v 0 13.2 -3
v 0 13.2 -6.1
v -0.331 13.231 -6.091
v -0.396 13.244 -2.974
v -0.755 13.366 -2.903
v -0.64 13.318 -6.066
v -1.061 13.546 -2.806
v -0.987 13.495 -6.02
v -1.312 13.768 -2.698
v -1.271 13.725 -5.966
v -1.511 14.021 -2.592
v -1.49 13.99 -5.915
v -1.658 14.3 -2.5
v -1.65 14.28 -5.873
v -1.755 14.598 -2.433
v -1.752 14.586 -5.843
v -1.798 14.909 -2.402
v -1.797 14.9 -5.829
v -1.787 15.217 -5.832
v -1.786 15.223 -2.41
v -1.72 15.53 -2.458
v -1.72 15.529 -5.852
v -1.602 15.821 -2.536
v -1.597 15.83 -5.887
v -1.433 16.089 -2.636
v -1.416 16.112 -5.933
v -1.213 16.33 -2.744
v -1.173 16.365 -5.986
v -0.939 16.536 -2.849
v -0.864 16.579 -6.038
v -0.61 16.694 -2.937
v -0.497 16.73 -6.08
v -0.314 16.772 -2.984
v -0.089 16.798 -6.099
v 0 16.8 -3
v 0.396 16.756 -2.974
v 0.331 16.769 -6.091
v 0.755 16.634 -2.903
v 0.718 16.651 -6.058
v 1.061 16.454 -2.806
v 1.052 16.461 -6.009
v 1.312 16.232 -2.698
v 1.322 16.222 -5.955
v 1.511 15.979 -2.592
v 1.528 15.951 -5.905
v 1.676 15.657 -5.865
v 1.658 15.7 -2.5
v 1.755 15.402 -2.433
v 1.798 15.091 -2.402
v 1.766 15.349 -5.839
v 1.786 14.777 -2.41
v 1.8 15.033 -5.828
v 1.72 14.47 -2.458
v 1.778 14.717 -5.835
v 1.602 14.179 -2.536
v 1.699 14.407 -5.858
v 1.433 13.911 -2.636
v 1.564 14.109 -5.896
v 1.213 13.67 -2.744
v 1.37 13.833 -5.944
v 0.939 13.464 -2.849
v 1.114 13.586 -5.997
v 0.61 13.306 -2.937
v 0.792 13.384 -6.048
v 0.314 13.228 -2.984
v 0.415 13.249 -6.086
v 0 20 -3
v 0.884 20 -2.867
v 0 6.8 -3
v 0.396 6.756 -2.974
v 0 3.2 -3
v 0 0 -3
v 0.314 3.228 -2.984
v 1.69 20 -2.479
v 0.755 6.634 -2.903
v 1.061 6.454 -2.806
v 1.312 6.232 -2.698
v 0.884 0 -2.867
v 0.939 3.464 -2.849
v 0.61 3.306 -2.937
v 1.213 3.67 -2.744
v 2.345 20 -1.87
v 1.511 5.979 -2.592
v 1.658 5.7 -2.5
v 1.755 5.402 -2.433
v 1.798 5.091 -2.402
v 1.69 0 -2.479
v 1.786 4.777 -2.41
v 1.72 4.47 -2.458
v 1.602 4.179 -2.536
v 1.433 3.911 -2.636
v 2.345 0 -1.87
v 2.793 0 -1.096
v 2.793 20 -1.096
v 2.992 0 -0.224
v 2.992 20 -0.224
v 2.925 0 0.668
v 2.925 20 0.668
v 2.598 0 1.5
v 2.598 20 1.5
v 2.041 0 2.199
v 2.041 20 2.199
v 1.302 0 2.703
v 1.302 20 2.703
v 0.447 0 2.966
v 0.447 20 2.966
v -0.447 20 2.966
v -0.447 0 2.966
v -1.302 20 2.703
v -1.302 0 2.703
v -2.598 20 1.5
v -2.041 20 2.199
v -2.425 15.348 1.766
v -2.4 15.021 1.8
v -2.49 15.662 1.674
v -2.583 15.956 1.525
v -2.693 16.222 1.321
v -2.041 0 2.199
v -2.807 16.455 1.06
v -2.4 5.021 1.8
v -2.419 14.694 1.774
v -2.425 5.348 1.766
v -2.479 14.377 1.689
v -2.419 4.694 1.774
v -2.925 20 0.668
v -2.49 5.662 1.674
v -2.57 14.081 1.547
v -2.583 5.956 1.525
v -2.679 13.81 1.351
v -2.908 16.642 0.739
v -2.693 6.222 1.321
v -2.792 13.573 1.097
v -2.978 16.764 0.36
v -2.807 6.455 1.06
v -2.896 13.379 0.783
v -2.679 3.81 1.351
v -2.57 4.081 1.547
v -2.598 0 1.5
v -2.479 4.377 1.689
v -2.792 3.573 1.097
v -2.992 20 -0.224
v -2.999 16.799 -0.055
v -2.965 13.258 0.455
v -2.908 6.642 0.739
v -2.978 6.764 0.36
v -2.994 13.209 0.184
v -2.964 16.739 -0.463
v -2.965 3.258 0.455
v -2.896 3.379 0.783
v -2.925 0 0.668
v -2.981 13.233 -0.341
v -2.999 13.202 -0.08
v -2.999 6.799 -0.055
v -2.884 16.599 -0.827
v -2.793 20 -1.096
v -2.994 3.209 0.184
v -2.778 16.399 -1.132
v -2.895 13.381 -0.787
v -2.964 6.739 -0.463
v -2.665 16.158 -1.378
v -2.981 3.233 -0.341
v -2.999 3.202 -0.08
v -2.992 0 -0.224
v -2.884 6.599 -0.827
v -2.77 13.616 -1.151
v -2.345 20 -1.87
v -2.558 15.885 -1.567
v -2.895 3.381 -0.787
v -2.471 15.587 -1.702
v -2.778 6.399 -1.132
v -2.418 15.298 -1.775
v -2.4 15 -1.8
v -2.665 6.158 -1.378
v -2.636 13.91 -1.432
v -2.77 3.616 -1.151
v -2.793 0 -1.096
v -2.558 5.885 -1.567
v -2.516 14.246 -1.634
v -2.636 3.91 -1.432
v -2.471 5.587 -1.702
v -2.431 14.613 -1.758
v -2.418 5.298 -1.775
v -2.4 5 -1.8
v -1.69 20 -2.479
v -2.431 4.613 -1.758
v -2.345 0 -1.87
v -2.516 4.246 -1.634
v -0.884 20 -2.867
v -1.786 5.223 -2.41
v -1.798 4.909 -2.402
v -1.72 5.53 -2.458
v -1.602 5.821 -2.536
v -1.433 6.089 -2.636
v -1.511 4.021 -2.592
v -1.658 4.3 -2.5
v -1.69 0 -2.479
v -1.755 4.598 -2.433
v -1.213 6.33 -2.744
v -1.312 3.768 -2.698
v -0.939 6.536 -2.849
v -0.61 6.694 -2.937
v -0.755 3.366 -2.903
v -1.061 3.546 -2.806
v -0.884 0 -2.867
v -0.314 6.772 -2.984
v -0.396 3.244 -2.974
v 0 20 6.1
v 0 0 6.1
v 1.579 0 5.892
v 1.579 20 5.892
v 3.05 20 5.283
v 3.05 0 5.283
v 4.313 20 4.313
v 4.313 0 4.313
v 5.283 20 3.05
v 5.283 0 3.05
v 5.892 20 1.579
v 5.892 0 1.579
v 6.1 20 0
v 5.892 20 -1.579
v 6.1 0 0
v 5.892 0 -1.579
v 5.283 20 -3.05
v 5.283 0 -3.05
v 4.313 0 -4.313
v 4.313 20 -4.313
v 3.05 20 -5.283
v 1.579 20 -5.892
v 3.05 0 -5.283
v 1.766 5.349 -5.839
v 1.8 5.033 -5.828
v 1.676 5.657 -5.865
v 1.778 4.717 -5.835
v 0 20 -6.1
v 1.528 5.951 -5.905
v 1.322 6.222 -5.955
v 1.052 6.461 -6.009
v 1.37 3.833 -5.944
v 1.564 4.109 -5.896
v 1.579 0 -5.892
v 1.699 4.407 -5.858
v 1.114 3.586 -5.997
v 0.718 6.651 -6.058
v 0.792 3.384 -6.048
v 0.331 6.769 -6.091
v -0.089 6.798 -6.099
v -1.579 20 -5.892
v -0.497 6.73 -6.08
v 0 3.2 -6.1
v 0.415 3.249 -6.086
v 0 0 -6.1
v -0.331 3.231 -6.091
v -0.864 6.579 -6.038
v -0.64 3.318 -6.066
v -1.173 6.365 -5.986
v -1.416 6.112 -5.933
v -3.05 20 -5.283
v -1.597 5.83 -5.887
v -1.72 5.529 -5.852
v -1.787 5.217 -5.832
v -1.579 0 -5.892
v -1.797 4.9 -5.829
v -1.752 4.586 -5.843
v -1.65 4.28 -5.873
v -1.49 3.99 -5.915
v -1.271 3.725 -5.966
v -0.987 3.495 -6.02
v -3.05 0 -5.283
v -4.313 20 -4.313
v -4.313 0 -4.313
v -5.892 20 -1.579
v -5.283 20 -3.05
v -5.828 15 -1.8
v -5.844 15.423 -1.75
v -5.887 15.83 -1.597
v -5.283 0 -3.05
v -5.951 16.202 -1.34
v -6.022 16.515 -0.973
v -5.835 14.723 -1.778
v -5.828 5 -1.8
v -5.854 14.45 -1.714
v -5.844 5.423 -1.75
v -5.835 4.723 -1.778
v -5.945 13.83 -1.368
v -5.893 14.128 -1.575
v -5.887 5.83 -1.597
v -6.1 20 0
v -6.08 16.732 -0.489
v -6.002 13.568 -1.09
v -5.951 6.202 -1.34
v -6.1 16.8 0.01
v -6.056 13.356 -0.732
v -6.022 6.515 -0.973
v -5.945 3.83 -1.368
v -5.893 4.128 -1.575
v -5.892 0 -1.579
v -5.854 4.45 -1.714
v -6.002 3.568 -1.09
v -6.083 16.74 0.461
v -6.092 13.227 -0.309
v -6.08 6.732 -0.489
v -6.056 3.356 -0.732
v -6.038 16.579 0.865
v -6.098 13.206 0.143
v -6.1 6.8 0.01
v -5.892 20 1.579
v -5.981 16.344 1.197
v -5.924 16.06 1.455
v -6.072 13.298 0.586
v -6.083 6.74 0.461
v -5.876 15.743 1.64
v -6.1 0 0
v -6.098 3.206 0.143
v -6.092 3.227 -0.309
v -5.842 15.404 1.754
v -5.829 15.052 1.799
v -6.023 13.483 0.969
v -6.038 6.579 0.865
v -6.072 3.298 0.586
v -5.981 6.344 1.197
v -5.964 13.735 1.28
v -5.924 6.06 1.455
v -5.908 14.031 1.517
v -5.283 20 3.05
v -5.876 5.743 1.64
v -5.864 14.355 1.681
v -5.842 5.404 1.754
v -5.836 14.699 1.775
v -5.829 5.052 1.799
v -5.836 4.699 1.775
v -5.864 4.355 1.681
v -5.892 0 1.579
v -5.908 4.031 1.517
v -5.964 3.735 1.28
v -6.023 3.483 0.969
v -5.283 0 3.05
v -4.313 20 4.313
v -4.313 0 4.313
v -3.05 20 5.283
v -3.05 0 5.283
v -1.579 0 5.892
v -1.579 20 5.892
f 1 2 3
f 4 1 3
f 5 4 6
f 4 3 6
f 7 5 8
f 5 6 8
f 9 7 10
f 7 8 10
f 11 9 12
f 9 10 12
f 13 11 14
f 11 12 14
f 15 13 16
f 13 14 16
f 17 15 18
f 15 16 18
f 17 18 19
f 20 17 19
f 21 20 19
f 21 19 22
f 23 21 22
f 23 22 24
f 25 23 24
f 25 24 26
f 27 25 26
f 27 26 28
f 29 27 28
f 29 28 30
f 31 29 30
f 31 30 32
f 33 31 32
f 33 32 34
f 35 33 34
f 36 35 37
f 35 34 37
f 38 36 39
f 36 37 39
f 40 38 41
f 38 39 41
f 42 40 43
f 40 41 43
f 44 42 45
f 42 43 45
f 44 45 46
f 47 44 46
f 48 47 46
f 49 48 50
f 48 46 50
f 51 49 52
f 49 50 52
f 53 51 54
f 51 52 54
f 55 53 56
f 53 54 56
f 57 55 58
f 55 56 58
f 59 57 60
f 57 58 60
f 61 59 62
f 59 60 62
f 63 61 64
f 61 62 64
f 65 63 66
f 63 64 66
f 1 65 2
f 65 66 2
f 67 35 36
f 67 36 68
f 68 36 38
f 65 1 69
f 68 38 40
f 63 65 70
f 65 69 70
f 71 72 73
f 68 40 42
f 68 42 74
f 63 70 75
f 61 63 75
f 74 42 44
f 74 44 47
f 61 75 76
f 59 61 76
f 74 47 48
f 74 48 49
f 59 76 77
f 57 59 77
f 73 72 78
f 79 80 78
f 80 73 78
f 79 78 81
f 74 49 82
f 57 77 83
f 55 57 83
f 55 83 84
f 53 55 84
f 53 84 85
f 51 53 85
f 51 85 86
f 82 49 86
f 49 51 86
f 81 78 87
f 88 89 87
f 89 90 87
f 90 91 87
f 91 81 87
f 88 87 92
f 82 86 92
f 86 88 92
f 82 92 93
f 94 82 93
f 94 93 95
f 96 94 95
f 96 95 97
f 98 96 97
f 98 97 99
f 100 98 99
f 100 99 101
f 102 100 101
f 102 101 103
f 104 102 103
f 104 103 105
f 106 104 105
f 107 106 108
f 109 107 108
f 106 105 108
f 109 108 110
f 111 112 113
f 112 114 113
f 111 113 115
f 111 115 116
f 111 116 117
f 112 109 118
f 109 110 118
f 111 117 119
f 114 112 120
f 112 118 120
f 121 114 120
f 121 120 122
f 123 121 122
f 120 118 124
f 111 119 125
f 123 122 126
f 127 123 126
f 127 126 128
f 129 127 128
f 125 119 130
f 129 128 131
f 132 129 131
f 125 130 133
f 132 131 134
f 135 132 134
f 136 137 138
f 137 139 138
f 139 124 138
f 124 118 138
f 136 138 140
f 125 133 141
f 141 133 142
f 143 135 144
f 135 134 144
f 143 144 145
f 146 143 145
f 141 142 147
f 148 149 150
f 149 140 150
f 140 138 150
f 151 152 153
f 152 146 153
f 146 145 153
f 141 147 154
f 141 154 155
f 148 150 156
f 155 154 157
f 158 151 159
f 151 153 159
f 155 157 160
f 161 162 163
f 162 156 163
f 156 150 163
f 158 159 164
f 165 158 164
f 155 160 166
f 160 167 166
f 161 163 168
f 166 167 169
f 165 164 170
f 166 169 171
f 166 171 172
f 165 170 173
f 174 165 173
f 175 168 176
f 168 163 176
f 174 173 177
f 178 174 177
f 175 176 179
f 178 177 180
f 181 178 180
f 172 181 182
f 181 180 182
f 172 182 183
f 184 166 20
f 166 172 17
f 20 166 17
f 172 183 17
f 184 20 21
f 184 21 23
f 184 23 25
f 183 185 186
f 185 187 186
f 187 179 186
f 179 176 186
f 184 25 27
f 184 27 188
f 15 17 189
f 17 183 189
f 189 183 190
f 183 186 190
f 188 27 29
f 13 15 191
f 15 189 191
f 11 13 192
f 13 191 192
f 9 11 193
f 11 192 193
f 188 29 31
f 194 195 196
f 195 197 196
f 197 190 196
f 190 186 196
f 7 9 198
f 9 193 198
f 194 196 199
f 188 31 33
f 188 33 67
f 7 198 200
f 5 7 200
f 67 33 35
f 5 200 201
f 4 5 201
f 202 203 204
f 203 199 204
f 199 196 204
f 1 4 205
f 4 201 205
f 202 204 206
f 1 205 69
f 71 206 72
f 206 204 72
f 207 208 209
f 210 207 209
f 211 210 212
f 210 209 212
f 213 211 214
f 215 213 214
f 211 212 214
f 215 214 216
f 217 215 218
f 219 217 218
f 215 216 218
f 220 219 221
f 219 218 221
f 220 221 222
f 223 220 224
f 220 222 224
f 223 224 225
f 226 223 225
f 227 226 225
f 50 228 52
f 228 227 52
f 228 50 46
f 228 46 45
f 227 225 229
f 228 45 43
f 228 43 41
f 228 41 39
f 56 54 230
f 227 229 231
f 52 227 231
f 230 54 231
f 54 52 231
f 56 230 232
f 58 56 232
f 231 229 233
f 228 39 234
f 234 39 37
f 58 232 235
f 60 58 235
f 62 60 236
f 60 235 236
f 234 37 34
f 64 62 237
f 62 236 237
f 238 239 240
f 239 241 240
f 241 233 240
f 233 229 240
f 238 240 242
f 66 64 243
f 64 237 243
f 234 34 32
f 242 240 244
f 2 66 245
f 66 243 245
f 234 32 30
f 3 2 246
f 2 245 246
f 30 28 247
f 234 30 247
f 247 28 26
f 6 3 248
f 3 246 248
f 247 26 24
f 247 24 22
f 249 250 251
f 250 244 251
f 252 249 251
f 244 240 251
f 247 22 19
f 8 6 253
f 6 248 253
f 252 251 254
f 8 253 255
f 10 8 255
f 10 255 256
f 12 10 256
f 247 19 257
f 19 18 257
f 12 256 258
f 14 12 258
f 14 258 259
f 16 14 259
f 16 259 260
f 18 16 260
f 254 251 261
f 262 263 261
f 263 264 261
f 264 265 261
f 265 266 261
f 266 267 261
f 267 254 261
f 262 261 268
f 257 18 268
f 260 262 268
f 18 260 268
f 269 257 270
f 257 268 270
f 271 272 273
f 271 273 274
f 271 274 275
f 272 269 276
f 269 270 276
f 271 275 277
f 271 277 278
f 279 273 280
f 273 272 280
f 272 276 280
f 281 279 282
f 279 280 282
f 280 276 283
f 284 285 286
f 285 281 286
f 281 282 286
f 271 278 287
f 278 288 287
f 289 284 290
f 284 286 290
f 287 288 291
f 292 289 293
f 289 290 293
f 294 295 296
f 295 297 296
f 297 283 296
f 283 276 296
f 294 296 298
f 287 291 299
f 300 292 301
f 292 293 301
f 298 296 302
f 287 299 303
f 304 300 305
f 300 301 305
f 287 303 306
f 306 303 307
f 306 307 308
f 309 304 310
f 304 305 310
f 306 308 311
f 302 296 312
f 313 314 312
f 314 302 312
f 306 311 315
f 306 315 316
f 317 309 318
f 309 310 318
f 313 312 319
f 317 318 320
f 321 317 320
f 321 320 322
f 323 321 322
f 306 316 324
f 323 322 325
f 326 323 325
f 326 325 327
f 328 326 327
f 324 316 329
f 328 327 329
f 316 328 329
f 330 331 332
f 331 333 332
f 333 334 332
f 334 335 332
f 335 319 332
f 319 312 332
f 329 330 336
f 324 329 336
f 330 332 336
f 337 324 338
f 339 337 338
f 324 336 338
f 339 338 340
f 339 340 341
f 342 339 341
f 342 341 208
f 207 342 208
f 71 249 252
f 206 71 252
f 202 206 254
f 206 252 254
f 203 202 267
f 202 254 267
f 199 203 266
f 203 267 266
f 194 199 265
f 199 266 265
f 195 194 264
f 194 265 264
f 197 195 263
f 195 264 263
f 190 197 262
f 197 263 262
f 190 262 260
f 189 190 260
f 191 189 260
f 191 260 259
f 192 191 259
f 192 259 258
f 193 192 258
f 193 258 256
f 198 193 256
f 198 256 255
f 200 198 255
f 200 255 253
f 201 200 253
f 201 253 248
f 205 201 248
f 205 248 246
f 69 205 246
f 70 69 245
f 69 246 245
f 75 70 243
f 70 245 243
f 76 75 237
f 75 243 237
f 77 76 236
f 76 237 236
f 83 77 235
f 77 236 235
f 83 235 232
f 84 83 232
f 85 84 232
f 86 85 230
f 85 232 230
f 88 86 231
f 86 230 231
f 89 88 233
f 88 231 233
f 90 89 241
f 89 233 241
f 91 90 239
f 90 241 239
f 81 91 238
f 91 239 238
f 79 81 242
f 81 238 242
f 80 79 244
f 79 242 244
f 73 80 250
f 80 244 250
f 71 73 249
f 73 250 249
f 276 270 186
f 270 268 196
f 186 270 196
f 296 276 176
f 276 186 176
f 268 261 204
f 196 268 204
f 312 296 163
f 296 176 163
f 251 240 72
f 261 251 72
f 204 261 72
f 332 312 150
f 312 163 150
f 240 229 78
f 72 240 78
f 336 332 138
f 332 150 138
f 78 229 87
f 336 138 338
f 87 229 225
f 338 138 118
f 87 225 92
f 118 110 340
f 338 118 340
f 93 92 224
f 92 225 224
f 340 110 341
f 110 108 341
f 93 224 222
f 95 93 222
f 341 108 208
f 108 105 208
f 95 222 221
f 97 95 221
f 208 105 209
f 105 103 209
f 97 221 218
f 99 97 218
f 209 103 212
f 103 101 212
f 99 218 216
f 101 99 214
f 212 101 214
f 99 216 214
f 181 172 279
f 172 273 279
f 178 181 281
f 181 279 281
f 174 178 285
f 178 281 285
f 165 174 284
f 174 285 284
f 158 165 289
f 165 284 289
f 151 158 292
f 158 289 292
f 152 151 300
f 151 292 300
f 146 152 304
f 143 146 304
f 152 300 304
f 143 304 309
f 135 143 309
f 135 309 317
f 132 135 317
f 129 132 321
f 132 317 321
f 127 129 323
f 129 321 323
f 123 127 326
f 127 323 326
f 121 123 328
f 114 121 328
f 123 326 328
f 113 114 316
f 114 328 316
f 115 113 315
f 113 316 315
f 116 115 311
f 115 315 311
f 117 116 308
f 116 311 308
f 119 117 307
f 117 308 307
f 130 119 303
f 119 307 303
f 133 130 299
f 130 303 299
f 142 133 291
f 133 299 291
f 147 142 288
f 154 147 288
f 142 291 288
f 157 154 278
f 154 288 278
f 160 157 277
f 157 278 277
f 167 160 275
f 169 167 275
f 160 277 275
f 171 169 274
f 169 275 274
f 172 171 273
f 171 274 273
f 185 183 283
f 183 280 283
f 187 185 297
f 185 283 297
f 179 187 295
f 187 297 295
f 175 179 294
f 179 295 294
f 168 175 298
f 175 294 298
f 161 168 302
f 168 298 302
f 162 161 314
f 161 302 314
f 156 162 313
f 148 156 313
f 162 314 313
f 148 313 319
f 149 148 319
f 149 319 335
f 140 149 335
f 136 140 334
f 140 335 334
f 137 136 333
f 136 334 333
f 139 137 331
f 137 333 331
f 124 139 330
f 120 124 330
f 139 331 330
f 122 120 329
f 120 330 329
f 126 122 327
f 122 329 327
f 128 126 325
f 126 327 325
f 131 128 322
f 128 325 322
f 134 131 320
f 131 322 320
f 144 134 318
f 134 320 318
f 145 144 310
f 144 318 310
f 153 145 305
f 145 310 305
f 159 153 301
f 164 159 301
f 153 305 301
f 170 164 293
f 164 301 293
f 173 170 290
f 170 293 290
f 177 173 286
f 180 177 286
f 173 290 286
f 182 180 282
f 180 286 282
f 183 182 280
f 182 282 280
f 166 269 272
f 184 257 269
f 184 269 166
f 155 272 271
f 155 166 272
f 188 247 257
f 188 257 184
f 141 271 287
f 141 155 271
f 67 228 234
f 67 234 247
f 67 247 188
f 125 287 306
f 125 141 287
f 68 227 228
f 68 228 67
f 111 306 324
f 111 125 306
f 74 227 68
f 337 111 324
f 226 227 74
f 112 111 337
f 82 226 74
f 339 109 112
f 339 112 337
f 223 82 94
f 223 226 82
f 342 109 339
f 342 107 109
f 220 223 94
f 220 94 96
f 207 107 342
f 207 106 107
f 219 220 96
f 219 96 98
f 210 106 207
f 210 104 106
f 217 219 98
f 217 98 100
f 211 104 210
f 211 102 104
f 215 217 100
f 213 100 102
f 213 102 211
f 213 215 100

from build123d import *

# Parameters (mm, degrees)
CROQUIS1_R                            = 6.1
SALIENTE_EXTRUIR1_DEPTH               = 20
CROQUIS3_R                            = 3
CORTAR_EXTRUIR1_DEPTH                 = 22.781184541
CROQUIS5_W                            = 1.8
CROQUIS5_H                            = 6.1
TALADRO_DE_MARGEN_PARA_M31_AT_2_COUNT = 2
TALADRO_DE_MARGEN_PARA_M31_AT_2_PITCH = 10
CROQUIS7_W                            = 1.8
CROQUIS7_H                            = 6.1
TALADRO_DE_MARGEN_PARA_M32_AT_2_COUNT = 2
TALADRO_DE_MARGEN_PARA_M32_AT_2_PITCH = 10


with BuildPart() as part:
    # Croquis1 → Saliente-Extruir1 (new body)
    with BuildSketch(Plane(origin=(0, 0, 0), x_dir=(-1, 0, 0), z_dir=(0, 1, 0))):
        with Locations(Location((0, 0, 0), (0, 0, 90))):
            Circle(CROQUIS1_R)
    extrude(amount=SALIENTE_EXTRUIR1_DEPTH)

    # Croquis3 → Cortar-Extruir1 (cut, through all)
    with BuildSketch(Plane.XZ):
        with Locations(Location((0, 0, 0), (0, 0, 270))):
            Circle(CROQUIS3_R)
    extrude(amount=-CORTAR_EXTRUIR1_DEPTH, mode=Mode.SUBTRACT)

    # Croquis5 → Taladro de margen para M31 (revolve, cut)
    with BuildSketch(Plane(origin=(0, 15, 0), x_dir=(0, -1, 0), z_dir=(1, 0, 0))):
        with Locations((0.9, 3.05)):
            Rectangle(CROQUIS5_W, CROQUIS5_H)
    taladro_de_margen_para_m31 = revolve(axis=Axis((0, 15, 6.35), (0, 0, -1)), mode=Mode.SUBTRACT)

    # Taladro de margen para M31 at 2: Taladro de margen para M31 ×2
    with Locations(*[(0, -i * TALADRO_DE_MARGEN_PARA_M31_AT_2_PITCH, 0) for i in range(1, TALADRO_DE_MARGEN_PARA_M31_AT_2_COUNT)]):
        add(taladro_de_margen_para_m31, mode=Mode.SUBTRACT)

    # Croquis7 → Taladro de margen para M32 (revolve, cut)
    with BuildSketch(Plane(origin=(0, 5, 0), x_dir=(0, 0, -1), z_dir=(0, 1, 0))):
        with Locations((0.9, 3.05)):
            Rectangle(CROQUIS7_W, CROQUIS7_H)
    taladro_de_margen_para_m32 = revolve(axis=Axis((6.35, 5, 0), (-1, 0, 0)), mode=Mode.SUBTRACT)

    # Taladro de margen para M32 at 2: Taladro de margen para M32 ×2
    with Locations(*[(0, i * TALADRO_DE_MARGEN_PARA_M32_AT_2_PITCH, 0) for i in range(1, TALADRO_DE_MARGEN_PARA_M32_AT_2_COUNT)]):
        add(taladro_de_margen_para_m32, mode=Mode.SUBTRACT)


solid = part.part
